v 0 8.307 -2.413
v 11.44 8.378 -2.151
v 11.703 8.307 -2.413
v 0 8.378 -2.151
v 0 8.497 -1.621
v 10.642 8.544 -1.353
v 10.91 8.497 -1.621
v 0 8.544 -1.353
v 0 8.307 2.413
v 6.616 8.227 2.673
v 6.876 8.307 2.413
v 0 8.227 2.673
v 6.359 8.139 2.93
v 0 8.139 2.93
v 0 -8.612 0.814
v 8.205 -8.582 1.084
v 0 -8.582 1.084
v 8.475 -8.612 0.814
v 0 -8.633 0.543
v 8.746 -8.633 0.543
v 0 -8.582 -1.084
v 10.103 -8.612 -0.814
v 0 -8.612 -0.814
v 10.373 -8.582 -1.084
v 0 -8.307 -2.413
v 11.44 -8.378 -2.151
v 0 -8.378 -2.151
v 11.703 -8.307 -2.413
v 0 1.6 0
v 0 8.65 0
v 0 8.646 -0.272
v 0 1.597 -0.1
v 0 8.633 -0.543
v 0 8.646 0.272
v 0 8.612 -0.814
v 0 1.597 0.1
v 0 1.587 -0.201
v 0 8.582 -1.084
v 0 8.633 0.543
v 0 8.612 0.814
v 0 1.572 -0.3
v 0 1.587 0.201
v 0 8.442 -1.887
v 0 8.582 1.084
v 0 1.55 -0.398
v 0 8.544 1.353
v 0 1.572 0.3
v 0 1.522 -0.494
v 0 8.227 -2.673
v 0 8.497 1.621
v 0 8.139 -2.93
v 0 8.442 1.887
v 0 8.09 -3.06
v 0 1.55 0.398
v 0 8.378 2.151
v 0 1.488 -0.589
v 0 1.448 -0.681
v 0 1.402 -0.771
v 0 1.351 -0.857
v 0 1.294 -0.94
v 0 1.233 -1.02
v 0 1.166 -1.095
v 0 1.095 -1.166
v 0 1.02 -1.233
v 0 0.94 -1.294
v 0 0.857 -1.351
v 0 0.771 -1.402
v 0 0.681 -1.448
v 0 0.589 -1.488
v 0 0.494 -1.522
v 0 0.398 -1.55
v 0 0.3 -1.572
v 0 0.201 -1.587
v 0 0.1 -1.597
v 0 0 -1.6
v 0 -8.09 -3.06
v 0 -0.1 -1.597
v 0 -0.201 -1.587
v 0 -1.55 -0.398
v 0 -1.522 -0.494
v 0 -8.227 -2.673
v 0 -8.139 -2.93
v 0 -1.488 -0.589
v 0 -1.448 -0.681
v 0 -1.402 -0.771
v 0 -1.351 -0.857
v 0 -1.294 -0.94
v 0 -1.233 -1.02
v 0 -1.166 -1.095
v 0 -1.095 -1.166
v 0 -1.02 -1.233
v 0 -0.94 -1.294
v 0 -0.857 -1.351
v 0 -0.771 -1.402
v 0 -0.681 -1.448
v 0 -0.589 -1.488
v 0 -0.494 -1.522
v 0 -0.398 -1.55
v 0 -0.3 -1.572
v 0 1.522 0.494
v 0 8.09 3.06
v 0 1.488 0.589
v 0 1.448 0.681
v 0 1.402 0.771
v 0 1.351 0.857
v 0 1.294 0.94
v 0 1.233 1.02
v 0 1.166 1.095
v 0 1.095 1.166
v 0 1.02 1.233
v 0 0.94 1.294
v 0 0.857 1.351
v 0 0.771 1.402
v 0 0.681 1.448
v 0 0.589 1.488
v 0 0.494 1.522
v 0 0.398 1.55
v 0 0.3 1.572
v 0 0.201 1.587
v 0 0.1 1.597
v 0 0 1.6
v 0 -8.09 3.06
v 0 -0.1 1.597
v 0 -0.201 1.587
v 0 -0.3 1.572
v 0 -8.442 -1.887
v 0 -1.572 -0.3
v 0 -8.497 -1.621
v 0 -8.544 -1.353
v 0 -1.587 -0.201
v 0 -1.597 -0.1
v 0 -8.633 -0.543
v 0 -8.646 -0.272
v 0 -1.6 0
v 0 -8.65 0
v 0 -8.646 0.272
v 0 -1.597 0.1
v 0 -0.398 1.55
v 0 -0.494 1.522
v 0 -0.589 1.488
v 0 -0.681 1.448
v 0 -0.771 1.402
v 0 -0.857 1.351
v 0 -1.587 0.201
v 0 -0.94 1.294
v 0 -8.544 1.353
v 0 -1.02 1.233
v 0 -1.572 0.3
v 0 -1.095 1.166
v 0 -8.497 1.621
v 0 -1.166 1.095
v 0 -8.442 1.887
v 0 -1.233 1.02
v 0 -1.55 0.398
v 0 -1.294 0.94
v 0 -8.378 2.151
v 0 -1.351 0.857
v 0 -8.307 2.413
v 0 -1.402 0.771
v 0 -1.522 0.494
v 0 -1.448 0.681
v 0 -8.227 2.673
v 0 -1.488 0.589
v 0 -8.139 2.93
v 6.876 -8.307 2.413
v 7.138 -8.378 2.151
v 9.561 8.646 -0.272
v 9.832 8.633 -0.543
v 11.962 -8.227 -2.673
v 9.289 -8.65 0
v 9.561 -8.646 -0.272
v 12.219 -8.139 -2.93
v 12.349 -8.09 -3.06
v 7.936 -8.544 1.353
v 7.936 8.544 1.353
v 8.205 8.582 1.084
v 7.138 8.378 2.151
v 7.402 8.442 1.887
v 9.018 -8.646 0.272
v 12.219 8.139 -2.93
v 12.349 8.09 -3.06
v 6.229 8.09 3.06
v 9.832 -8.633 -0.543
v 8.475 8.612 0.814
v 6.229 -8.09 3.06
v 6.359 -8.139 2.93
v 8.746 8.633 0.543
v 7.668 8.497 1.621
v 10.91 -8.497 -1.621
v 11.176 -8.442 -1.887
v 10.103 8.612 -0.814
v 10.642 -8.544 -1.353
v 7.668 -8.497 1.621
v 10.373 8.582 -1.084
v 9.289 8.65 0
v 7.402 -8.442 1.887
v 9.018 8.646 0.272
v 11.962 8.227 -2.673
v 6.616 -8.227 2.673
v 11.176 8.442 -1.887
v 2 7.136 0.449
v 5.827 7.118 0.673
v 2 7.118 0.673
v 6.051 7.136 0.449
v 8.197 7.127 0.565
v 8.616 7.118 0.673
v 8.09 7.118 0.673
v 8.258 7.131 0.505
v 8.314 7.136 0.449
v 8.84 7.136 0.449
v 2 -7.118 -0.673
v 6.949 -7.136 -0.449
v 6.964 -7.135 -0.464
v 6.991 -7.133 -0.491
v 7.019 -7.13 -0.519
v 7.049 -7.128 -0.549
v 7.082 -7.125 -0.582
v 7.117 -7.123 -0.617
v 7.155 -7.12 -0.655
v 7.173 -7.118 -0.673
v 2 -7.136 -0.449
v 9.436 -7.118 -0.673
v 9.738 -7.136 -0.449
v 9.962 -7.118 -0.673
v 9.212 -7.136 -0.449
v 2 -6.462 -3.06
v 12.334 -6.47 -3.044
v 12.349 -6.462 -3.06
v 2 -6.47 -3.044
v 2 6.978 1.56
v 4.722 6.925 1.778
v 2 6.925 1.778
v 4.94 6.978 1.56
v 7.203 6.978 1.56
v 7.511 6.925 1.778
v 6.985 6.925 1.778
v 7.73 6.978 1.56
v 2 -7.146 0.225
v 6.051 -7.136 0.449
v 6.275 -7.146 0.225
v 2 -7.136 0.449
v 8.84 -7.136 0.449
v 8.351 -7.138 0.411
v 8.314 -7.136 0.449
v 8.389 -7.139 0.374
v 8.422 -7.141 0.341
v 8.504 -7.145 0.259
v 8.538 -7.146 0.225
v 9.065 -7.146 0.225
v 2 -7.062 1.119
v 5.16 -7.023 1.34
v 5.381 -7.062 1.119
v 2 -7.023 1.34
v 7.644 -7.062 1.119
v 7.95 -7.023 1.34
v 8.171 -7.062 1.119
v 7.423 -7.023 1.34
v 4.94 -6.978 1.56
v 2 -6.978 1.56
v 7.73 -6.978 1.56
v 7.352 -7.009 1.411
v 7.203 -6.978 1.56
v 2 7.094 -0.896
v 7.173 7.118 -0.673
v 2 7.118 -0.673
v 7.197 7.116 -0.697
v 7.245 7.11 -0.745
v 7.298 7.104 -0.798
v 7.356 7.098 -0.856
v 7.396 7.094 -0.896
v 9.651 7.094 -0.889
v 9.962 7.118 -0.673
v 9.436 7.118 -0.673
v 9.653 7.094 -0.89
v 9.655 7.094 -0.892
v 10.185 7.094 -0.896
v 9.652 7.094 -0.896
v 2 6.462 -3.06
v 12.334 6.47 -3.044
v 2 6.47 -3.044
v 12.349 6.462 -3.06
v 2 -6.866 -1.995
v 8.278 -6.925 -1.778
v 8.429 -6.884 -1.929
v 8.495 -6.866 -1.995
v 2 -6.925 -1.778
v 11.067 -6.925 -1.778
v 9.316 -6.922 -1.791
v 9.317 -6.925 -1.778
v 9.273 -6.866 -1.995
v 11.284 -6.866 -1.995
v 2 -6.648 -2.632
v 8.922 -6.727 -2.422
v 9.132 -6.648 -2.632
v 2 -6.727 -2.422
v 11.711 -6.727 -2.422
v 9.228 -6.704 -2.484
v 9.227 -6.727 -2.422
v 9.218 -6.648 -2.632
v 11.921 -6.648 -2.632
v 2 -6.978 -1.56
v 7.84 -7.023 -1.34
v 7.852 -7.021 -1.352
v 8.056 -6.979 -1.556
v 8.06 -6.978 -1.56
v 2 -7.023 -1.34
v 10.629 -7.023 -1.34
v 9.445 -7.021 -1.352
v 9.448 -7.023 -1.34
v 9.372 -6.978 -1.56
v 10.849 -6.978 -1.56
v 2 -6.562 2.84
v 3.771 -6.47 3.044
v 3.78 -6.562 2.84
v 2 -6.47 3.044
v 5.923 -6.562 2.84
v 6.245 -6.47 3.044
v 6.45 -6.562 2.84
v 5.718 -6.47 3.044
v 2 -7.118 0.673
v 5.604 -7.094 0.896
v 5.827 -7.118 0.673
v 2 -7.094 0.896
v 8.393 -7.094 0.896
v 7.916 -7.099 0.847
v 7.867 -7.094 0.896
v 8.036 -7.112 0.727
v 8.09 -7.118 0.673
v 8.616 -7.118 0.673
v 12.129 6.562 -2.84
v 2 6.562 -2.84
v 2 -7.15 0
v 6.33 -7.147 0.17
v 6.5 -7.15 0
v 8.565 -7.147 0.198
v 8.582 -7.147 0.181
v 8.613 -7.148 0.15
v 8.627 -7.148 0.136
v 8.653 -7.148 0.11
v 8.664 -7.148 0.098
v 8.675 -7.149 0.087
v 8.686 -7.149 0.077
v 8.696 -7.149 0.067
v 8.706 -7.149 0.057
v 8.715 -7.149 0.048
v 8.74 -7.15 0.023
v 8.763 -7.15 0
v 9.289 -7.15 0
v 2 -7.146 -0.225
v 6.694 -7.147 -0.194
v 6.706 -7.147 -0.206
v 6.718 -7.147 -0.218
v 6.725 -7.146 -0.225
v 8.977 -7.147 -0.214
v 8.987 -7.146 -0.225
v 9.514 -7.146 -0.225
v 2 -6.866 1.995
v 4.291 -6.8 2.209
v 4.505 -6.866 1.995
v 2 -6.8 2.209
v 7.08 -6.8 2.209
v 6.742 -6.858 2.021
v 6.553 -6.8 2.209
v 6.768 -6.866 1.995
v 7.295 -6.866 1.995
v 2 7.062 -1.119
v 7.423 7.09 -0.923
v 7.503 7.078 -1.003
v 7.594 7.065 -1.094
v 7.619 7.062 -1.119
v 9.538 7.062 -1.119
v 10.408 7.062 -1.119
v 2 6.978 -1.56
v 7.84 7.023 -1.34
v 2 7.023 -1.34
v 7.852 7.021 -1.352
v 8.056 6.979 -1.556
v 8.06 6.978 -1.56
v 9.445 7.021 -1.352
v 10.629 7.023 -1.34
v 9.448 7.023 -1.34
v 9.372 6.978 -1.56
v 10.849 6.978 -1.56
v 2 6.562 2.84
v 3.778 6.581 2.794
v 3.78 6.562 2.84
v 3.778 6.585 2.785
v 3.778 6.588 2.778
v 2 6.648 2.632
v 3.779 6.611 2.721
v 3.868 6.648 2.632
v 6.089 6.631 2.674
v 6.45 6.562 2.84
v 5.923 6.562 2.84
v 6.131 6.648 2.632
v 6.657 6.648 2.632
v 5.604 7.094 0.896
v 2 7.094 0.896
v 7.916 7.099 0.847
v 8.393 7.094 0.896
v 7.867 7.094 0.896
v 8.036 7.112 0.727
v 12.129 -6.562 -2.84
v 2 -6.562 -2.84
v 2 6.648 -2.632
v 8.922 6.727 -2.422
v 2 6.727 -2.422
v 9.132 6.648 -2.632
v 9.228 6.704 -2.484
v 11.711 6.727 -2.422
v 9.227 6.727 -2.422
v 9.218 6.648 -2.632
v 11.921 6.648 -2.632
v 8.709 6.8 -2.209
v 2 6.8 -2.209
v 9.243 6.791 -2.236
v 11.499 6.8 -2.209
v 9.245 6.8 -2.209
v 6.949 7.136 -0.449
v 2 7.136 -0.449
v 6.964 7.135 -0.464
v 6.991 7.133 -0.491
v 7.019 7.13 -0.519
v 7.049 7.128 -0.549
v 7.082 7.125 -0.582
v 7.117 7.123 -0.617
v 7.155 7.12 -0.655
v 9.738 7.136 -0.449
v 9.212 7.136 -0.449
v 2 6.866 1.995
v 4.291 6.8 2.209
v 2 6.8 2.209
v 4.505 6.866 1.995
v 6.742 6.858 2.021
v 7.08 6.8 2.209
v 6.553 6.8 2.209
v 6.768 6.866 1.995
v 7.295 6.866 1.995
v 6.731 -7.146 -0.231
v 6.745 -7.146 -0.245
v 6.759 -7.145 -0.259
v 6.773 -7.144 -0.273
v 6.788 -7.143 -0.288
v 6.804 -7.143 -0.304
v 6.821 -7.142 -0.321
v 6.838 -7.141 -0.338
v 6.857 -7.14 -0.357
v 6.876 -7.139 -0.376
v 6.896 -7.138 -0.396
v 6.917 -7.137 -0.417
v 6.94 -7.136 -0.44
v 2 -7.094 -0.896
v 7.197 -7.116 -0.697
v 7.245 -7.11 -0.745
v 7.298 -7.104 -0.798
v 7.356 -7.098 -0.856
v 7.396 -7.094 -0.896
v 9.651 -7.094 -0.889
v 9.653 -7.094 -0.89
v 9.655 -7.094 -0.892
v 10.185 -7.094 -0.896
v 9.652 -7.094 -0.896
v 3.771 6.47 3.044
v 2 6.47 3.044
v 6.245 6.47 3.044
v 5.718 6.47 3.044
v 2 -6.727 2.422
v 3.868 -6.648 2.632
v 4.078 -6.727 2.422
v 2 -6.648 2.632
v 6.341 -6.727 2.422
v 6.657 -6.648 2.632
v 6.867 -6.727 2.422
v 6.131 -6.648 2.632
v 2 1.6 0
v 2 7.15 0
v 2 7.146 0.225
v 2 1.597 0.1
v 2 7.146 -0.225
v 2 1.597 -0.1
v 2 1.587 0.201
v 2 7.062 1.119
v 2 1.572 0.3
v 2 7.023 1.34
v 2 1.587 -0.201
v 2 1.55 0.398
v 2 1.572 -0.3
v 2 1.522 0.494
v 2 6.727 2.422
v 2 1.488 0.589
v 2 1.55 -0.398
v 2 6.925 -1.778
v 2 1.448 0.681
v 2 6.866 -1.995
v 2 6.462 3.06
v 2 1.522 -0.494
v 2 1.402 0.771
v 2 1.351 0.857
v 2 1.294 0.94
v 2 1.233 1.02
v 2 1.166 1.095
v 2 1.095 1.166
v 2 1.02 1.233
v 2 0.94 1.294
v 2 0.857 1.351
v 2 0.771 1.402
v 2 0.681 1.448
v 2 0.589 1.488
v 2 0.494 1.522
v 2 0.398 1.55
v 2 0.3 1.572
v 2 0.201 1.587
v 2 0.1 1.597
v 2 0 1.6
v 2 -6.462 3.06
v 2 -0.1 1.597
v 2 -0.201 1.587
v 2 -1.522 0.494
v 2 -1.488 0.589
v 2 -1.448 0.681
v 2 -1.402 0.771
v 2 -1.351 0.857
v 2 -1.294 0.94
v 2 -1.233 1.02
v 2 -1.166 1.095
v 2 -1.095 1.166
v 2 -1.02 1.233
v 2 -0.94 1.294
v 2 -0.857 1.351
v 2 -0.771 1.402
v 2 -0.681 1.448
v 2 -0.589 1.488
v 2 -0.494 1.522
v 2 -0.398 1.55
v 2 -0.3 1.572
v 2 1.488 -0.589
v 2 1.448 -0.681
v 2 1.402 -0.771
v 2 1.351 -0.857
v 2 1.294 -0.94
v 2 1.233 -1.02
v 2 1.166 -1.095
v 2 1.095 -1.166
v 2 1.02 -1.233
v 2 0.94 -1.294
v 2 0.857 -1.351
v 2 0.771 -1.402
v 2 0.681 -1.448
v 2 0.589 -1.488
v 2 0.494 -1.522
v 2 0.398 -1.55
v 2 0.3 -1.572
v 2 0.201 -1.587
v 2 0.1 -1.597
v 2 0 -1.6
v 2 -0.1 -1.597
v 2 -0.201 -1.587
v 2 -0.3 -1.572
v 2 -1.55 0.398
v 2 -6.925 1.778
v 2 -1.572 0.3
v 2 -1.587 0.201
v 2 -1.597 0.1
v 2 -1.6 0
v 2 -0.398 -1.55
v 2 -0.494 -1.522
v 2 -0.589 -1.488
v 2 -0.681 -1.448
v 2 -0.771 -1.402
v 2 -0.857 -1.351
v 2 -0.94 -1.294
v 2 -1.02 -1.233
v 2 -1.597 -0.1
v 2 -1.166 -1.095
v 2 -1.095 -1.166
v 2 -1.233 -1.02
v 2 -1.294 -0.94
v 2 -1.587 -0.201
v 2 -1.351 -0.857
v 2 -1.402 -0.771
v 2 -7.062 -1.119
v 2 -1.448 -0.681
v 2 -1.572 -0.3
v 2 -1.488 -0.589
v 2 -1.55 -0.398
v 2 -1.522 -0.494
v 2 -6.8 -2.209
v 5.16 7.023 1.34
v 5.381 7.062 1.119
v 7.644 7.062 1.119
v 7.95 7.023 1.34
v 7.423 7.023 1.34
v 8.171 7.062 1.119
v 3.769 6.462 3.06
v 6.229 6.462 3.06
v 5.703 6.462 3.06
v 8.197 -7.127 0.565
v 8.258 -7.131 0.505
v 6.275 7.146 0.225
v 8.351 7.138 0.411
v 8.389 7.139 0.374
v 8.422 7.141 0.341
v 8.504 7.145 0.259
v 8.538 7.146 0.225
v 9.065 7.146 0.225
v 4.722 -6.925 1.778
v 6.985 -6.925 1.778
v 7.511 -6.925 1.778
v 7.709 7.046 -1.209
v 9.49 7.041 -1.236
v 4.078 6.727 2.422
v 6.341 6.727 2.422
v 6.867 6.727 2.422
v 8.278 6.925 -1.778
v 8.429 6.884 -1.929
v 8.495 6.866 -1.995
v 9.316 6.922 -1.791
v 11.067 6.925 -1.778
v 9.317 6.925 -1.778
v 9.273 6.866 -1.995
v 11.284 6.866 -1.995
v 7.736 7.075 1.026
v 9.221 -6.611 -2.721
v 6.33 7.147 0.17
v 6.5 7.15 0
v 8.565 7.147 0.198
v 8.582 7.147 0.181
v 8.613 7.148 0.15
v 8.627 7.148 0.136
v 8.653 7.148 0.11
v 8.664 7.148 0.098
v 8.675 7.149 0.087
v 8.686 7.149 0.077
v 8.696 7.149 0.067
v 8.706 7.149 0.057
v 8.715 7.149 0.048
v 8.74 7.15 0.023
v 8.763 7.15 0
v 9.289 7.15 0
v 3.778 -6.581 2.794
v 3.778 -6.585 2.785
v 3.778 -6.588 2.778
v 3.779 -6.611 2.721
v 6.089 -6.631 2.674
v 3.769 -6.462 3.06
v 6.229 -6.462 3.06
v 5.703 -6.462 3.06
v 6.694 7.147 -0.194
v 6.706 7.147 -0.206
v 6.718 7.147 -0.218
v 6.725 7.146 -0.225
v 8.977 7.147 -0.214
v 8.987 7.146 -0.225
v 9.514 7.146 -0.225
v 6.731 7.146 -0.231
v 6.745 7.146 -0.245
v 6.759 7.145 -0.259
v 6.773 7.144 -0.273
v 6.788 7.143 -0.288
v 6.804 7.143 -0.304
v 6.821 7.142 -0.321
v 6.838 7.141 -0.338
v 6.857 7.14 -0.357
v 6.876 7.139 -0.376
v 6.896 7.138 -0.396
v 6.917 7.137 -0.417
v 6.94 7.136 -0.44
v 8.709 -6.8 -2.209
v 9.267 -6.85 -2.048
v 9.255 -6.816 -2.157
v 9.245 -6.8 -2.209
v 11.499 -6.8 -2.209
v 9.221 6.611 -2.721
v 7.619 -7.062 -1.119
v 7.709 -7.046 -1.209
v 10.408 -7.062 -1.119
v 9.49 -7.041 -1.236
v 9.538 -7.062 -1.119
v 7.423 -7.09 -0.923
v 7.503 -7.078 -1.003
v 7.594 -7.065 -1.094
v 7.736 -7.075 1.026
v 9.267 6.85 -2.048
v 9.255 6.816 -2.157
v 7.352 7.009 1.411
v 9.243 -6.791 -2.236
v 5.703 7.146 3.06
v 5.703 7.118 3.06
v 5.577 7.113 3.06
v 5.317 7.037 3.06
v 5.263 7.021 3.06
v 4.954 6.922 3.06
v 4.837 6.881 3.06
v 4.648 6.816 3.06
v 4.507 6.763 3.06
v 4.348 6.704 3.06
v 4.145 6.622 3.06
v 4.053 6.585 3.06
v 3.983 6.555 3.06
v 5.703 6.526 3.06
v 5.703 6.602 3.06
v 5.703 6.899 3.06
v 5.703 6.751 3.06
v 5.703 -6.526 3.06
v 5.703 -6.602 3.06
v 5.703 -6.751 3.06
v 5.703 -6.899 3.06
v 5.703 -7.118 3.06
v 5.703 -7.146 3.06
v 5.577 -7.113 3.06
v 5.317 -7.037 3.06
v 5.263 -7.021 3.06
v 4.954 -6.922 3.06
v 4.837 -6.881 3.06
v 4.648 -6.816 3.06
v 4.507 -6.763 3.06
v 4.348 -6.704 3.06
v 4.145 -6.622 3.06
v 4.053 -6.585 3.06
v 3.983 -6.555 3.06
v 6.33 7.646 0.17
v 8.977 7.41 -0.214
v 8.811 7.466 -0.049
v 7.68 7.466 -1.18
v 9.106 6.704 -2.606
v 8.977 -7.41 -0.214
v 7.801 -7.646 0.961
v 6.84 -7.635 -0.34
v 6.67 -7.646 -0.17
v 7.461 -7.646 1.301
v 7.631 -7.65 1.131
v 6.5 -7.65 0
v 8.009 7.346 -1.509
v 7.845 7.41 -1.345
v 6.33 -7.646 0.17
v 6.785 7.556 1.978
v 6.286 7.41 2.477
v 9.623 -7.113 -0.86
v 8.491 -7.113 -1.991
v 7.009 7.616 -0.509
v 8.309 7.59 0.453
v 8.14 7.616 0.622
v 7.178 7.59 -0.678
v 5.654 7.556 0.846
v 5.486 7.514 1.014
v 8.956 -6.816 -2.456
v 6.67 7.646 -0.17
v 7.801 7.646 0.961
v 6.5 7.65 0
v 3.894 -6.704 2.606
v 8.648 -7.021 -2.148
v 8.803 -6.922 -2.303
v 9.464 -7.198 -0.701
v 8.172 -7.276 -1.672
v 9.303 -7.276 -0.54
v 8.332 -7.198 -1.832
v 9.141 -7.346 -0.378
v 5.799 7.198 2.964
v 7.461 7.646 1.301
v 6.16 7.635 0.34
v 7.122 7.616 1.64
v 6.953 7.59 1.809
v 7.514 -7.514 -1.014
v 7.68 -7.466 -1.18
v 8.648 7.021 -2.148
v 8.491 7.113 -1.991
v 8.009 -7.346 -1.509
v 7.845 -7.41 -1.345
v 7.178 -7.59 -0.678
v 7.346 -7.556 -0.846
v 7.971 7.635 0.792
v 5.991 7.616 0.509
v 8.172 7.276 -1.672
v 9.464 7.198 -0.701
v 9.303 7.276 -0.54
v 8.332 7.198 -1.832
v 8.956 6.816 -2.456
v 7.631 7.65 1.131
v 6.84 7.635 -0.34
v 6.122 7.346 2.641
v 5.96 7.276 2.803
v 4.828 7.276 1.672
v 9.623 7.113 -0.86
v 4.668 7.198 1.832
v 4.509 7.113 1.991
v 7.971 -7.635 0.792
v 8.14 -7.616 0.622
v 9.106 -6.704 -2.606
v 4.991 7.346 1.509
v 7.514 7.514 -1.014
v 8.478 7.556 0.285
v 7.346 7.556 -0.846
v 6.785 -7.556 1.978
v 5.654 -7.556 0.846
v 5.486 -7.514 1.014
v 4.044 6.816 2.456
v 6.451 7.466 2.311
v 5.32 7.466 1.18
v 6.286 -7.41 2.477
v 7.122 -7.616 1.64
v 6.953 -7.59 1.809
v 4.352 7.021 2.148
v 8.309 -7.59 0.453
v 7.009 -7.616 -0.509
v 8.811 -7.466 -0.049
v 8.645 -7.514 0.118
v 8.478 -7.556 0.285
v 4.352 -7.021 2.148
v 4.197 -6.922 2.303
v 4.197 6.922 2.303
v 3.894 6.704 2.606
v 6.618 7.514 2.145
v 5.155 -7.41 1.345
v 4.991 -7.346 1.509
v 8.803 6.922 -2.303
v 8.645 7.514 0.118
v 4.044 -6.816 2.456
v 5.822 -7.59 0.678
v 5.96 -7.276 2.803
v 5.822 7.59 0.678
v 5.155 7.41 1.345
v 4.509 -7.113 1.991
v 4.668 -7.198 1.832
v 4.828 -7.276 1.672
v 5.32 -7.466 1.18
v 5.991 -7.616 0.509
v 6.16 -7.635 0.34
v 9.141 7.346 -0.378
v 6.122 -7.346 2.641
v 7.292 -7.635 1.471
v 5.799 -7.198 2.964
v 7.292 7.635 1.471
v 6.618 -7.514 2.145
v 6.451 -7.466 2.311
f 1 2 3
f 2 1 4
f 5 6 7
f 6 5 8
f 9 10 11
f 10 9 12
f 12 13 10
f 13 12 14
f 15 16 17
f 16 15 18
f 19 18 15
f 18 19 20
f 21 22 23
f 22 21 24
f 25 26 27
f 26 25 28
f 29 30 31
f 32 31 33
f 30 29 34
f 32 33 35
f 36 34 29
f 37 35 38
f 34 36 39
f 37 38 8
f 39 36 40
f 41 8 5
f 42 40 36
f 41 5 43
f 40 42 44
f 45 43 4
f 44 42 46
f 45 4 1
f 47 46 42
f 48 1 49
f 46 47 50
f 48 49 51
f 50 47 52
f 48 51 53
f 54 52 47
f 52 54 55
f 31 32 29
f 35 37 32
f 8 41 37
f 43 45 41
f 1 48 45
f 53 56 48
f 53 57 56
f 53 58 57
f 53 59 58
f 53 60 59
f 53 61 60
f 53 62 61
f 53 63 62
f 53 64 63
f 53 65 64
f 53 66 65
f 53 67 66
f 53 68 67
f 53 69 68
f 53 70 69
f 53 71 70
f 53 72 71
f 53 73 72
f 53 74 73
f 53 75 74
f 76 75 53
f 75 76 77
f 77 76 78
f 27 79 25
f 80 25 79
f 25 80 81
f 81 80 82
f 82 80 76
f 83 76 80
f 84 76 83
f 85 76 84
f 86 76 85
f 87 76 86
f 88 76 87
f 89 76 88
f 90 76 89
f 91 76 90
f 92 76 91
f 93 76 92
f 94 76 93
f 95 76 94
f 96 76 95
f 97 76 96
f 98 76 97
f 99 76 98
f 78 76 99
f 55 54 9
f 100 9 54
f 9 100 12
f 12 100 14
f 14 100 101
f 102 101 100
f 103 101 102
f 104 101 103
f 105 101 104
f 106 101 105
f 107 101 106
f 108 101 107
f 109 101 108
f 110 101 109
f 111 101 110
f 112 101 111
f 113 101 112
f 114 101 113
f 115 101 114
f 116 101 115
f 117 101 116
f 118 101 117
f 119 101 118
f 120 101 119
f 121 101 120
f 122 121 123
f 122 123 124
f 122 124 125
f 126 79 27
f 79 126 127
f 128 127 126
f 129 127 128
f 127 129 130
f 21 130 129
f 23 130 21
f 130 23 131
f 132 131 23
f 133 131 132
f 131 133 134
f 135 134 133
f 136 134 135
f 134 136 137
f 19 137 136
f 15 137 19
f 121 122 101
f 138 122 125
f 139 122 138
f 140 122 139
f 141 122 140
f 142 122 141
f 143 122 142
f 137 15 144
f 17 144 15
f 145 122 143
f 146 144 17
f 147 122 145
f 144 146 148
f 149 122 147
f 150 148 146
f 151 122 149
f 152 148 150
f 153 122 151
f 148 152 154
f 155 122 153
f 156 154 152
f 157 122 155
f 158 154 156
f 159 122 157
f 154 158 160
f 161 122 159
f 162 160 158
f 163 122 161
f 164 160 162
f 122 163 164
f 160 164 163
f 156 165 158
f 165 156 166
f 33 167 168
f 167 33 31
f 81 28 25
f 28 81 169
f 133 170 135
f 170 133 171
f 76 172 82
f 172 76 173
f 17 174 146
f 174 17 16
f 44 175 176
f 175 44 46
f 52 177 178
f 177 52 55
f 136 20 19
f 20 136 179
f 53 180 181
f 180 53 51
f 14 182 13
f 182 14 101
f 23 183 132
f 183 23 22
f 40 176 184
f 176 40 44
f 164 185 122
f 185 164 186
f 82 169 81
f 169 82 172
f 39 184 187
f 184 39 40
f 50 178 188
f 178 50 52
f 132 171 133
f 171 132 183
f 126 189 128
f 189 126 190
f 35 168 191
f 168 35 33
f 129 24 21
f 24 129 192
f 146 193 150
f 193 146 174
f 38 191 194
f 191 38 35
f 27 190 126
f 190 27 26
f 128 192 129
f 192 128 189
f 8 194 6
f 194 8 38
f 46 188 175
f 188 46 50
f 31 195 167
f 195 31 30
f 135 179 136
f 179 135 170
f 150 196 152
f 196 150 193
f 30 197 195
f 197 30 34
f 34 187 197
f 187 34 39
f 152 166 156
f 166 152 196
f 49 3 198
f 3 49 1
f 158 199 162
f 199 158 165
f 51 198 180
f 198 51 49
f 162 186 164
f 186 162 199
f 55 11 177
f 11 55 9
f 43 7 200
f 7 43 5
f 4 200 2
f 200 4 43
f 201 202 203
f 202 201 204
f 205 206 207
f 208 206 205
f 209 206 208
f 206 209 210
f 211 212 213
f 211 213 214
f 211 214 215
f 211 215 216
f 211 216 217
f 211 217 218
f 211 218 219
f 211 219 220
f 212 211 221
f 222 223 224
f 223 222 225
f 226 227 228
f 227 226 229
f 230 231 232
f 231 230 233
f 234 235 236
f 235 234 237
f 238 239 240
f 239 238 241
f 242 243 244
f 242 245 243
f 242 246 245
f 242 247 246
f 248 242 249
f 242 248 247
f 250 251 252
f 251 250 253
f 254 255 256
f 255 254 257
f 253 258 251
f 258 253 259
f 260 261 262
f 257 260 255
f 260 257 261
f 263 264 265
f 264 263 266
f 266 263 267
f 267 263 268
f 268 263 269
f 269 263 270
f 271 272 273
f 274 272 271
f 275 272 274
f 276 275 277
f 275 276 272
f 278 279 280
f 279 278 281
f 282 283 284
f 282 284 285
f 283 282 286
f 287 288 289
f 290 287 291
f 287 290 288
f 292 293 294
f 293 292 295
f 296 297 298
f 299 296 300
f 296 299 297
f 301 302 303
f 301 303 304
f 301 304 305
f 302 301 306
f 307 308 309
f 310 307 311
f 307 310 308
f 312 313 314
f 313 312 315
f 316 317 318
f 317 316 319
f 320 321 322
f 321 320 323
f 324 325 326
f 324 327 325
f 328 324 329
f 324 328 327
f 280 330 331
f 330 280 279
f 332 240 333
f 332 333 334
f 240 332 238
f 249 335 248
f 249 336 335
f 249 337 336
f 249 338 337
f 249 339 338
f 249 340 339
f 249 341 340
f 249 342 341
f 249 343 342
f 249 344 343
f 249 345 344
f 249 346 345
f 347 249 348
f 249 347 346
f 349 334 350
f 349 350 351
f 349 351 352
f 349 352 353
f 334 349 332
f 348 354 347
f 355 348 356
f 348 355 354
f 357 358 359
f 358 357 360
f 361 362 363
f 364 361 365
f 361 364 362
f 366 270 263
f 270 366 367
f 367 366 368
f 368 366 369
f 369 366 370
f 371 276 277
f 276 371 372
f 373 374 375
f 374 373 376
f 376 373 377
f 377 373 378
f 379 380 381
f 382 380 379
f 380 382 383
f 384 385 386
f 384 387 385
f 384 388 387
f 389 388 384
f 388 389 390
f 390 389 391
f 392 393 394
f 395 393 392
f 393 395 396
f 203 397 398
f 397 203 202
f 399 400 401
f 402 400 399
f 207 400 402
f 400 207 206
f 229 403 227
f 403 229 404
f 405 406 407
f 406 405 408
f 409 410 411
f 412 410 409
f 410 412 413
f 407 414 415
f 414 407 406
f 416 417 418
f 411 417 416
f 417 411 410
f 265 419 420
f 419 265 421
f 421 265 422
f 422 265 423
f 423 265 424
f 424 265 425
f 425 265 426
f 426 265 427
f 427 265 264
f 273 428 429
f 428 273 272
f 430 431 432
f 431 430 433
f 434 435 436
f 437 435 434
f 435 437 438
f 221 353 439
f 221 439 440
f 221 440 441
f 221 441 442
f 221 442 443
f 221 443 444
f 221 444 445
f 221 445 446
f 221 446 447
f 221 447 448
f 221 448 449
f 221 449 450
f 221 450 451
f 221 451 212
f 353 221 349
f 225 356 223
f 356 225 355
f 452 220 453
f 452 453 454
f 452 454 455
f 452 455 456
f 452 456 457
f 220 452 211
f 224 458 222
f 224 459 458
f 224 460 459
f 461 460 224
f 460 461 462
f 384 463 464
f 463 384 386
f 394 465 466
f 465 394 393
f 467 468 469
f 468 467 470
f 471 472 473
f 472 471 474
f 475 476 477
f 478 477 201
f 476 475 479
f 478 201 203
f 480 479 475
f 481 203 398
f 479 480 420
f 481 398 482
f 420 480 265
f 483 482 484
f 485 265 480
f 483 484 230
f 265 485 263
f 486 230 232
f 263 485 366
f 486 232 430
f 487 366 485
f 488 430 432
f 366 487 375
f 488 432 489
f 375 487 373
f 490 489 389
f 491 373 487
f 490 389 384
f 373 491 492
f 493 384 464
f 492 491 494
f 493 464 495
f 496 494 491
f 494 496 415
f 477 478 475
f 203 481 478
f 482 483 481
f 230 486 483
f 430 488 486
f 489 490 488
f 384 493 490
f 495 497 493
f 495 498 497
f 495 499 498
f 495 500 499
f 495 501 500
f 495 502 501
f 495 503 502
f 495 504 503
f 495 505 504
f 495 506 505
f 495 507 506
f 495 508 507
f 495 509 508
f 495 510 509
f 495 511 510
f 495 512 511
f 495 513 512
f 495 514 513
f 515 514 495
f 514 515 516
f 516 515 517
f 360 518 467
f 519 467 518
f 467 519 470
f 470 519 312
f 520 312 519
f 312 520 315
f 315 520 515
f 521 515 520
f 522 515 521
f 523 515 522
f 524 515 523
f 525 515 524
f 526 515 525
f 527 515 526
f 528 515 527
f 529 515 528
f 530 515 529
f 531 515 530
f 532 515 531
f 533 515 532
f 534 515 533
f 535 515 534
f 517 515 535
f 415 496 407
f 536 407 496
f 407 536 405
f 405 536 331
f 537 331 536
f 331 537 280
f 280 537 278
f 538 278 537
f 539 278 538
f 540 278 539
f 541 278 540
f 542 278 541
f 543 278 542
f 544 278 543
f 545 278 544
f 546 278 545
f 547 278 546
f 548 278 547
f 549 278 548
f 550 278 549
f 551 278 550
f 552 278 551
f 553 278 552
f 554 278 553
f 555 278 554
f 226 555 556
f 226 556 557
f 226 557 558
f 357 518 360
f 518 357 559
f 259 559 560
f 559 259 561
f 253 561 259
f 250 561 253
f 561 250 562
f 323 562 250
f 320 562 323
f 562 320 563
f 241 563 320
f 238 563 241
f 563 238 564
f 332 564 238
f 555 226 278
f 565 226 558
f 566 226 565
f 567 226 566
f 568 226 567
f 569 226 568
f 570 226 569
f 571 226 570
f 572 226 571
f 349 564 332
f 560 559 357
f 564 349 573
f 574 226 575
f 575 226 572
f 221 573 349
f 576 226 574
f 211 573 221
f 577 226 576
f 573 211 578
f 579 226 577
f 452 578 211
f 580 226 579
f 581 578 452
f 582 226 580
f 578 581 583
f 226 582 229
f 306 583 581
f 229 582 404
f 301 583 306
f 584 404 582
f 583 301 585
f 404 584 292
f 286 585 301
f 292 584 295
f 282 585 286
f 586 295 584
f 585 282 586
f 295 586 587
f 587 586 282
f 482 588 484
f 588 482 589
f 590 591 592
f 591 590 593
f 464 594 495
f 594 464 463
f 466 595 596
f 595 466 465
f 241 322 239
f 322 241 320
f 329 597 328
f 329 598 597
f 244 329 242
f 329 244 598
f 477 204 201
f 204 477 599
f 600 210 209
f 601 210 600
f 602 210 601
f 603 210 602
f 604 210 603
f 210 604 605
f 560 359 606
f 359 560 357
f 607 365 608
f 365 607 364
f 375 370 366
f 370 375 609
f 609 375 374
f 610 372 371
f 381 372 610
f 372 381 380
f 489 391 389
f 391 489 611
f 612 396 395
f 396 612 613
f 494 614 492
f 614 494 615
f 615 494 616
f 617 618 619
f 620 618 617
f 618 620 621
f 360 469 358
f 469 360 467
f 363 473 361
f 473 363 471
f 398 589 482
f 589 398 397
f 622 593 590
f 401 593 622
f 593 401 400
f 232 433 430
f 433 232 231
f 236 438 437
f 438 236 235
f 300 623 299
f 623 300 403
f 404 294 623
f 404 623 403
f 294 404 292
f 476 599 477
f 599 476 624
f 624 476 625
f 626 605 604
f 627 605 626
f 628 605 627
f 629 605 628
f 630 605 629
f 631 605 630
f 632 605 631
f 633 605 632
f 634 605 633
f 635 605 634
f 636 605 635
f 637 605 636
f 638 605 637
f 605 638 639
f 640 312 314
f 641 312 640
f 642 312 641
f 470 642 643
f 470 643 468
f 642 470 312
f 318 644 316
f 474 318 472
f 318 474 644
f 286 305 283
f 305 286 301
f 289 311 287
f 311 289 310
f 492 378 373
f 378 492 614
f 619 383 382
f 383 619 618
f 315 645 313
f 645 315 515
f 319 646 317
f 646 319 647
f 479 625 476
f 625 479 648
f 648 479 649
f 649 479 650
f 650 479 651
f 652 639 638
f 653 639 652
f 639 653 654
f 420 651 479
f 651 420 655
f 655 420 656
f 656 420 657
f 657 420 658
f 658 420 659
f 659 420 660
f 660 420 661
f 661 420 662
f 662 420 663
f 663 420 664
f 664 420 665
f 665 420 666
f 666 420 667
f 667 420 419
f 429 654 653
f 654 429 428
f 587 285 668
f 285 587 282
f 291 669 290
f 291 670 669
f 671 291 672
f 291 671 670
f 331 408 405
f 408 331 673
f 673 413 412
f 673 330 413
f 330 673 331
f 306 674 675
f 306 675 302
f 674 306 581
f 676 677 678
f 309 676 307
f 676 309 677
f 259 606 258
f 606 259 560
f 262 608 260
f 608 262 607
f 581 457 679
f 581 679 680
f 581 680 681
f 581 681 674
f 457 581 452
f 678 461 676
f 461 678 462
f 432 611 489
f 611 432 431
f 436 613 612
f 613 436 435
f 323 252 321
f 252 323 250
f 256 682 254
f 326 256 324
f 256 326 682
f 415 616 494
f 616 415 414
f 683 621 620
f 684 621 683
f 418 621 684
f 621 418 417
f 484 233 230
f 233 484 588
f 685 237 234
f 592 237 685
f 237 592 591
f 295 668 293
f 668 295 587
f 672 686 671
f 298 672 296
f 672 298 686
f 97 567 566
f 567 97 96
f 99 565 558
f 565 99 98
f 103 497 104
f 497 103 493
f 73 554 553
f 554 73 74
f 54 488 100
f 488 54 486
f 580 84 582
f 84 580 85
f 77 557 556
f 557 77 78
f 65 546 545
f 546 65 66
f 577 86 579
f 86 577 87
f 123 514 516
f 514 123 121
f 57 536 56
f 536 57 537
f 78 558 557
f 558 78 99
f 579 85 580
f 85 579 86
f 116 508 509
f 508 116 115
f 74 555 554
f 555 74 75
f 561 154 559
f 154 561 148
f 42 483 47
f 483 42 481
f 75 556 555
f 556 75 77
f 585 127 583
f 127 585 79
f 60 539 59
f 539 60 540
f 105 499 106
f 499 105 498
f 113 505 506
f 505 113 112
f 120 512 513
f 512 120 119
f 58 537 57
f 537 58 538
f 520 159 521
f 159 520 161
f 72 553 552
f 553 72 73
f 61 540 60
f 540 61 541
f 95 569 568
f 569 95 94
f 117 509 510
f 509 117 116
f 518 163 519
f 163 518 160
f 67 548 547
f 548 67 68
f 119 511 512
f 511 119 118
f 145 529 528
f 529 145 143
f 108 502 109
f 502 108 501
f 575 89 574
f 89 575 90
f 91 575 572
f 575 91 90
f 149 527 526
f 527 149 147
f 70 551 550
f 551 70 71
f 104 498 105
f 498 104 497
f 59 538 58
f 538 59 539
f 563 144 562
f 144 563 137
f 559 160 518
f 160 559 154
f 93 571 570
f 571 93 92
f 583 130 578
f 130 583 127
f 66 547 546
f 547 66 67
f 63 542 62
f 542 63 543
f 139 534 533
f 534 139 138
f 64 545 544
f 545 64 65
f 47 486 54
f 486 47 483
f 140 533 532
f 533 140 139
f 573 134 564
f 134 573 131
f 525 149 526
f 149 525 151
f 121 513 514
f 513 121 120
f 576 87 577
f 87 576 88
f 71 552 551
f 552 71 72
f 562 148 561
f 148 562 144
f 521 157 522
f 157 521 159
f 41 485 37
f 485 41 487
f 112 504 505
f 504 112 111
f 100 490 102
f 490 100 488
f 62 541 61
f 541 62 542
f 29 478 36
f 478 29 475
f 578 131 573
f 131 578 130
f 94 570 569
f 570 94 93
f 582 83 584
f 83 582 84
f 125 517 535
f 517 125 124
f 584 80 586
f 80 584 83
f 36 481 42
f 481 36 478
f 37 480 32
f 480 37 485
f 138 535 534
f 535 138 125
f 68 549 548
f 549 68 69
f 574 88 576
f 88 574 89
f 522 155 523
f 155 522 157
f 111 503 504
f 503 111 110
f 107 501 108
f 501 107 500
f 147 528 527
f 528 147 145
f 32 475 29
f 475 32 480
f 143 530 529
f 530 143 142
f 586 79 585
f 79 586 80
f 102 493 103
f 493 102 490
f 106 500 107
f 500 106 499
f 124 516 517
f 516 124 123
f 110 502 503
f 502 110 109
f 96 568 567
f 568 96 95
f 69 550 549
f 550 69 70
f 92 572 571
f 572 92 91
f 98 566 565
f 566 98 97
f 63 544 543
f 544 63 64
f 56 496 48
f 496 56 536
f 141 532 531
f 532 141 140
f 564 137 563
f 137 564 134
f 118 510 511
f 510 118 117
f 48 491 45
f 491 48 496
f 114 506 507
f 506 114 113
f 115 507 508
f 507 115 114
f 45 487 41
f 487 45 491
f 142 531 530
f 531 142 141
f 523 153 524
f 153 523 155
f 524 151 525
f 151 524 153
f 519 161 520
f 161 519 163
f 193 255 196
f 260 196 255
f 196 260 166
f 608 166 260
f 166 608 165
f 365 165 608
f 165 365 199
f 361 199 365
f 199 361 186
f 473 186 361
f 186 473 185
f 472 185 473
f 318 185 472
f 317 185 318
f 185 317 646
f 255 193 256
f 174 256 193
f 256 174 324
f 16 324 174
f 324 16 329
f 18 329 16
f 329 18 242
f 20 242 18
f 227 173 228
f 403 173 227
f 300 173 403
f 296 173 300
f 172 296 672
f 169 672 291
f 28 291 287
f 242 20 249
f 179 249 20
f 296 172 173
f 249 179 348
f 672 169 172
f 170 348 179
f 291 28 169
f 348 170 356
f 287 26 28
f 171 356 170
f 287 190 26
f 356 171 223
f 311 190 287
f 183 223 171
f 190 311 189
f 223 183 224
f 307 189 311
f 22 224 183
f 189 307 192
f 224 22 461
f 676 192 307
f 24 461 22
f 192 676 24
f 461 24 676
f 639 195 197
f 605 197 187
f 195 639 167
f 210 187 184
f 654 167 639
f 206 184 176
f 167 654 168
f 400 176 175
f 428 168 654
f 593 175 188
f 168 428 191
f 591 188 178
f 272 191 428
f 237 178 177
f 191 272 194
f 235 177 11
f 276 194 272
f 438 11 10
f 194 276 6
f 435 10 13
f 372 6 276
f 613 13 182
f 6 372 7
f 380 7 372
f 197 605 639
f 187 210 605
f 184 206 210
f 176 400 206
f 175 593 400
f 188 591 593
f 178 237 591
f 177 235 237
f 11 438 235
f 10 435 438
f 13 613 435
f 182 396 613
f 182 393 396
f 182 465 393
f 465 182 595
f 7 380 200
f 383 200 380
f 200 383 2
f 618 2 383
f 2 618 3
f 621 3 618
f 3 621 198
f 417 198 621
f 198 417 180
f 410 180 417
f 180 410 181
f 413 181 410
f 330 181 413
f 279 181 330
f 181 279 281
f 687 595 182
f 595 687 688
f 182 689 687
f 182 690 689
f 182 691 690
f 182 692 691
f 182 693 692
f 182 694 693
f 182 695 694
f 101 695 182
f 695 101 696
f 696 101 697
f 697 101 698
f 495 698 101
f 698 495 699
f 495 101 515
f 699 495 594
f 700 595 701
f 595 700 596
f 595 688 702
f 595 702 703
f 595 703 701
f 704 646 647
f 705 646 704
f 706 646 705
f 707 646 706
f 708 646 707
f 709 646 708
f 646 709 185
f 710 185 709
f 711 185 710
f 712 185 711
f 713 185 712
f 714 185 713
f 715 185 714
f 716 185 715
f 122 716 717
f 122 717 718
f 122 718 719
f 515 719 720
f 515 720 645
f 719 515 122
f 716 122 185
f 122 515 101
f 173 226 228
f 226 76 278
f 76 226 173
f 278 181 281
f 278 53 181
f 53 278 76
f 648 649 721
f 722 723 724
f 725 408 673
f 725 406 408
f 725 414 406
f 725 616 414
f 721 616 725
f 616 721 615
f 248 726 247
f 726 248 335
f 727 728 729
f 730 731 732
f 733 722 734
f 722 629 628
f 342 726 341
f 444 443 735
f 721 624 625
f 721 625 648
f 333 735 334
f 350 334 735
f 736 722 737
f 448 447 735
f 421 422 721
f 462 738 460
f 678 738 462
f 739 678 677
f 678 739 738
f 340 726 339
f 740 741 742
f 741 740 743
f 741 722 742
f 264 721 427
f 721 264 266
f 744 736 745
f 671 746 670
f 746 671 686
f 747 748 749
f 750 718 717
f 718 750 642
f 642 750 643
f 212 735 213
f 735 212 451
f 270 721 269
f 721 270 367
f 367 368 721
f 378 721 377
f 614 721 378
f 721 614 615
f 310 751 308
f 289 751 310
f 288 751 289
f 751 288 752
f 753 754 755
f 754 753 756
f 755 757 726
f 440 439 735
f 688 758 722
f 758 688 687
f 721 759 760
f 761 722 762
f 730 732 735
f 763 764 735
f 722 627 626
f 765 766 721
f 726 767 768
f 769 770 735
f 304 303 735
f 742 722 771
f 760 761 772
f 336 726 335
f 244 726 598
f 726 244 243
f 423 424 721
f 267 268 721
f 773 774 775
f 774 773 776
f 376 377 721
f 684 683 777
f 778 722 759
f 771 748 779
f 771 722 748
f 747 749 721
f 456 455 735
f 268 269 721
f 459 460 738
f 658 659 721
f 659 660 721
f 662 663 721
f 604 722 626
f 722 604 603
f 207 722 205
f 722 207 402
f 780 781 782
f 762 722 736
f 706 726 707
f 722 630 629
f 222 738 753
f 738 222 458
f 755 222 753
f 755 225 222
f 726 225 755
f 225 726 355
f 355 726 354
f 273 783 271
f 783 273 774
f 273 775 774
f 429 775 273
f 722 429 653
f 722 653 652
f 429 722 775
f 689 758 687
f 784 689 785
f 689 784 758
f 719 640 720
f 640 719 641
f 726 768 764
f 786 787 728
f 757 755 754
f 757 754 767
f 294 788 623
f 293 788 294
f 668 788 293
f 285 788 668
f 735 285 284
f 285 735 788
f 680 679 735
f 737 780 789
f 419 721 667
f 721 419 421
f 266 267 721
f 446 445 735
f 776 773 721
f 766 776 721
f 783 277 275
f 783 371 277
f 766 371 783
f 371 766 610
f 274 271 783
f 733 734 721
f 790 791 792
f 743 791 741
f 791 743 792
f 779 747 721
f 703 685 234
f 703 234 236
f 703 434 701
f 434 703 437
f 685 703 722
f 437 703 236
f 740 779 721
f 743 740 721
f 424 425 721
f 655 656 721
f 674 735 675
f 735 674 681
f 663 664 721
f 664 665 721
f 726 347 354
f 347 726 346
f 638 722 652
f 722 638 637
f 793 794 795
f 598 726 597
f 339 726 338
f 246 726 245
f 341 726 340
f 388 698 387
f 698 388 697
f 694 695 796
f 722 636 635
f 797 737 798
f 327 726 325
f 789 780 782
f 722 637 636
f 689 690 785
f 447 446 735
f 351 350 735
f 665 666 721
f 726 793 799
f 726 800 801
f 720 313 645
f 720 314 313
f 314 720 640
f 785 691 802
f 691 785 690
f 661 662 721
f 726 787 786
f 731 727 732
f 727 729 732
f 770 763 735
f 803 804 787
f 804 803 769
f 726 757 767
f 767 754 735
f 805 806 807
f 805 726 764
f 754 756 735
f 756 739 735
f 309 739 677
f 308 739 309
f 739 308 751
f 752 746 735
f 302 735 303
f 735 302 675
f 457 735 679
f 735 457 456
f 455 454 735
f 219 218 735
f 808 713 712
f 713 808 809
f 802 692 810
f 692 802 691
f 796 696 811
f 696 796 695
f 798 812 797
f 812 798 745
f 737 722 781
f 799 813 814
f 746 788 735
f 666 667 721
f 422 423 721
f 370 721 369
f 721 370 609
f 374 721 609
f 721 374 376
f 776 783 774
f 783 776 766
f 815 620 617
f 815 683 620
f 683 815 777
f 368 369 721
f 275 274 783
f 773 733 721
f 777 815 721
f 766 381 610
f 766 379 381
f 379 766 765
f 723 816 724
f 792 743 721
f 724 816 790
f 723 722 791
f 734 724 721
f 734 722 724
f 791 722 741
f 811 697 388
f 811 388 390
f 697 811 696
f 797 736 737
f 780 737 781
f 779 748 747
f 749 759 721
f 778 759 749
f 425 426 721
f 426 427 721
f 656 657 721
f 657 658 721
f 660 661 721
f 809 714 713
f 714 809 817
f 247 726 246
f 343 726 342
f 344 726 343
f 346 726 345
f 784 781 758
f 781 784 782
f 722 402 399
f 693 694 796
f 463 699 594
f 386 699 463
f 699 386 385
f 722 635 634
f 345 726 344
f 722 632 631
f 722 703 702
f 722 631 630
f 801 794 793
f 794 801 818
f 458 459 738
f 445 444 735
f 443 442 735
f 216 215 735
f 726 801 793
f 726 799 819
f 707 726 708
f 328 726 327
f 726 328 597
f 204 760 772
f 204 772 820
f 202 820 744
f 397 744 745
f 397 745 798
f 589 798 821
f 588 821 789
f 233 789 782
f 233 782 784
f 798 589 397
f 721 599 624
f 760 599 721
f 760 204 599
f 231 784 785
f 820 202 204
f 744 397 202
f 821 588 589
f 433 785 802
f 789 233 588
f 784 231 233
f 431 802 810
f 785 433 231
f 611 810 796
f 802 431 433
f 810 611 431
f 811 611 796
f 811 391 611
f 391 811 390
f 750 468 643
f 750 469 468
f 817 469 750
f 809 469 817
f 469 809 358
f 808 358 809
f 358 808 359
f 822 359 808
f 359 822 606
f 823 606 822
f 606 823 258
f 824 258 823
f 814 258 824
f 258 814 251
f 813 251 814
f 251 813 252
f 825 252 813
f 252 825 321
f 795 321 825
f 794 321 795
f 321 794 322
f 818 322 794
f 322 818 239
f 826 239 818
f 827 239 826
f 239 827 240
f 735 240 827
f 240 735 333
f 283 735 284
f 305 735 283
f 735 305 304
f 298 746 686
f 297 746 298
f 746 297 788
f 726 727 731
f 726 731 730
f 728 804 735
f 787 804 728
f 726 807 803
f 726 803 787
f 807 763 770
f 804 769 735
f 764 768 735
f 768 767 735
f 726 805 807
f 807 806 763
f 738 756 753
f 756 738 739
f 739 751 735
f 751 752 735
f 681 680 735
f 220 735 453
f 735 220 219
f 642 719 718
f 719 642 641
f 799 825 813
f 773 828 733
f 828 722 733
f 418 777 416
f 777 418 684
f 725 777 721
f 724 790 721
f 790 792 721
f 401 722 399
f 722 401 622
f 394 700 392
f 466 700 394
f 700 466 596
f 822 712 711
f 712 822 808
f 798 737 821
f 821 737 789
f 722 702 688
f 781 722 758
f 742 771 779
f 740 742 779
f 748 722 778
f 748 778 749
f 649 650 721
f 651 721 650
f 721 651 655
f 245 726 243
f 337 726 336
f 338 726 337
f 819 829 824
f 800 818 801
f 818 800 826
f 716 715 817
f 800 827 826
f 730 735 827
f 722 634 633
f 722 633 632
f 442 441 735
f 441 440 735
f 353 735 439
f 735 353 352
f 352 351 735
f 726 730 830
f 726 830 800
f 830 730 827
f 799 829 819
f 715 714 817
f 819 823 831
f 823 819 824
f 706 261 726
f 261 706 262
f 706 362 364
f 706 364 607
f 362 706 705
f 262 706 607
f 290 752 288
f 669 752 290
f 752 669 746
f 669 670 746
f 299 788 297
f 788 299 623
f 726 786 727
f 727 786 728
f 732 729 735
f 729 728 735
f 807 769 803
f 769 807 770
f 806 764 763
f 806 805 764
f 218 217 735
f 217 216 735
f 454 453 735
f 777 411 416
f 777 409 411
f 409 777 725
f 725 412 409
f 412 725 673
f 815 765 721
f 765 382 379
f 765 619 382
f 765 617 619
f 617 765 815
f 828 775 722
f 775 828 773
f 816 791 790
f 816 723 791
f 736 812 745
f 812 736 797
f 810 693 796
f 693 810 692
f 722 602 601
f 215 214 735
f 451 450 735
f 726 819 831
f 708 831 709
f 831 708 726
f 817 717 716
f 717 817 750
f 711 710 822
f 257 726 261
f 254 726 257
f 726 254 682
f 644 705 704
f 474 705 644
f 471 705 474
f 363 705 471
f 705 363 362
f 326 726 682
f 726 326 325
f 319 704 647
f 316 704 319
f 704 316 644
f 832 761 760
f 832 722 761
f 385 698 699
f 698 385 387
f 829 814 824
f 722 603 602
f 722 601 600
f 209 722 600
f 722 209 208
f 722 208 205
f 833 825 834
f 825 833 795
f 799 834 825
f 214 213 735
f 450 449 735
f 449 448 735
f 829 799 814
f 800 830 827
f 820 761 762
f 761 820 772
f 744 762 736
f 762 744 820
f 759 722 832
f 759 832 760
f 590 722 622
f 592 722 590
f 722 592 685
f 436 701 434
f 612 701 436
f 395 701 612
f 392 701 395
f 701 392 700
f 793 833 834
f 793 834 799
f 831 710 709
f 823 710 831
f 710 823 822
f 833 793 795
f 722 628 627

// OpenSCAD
module led_holder(
        thickness = 2,
        length = 30,
        screw_diameter = 3.2,
        led_board_thickness = 1.6,
        led_board_diameter = 15.3,
        diameter_fraction = 0.4) {
    difference() {
        union() {
            // Base
            rotate([0, 90, 0]) {
                cylinder(d = led_board_diameter + thickness, h = length, center = false, $fn = 200);
            }
        }
        // Main hole
        translate([thickness, 0, 0]) {
            rotate([0, 90, 0]) {
                cylinder(d = led_board_diameter - thickness / 2, h = length, center = false, $fn = 200);
            }
        }
        // Screw hole
        translate([-thickness, 0, 0]) {
            rotate([0, 90, 0]) {
                cylinder(d = screw_diameter, h = thickness * 3, center = false, $fn = 100);
            }
        }
        // Cut off end
        translate([30, 0, 50]) {
            rotate([0, 45, 0]) {
                cube([100, 100, 100], center = true);
            }
        }
        // Cut off top
        translate([0, 0, 50 + led_board_diameter * diameter_fraction / 2]) {
            cube([100, 100, 100], center = true);
        }
        // Cut off bottom
        translate([0, 0, -50 - led_board_diameter * diameter_fraction / 2]) {
            cube([100, 100, 100], center = true);
        }
        // Board hole
        translate([6.5, 0, 0]) {
            rotate([0, 45, 0]) {
                #cylinder(d = led_board_diameter, h = led_board_thickness, center = false, $fn = 200);
            }
        }
    }
}

led_holder();
